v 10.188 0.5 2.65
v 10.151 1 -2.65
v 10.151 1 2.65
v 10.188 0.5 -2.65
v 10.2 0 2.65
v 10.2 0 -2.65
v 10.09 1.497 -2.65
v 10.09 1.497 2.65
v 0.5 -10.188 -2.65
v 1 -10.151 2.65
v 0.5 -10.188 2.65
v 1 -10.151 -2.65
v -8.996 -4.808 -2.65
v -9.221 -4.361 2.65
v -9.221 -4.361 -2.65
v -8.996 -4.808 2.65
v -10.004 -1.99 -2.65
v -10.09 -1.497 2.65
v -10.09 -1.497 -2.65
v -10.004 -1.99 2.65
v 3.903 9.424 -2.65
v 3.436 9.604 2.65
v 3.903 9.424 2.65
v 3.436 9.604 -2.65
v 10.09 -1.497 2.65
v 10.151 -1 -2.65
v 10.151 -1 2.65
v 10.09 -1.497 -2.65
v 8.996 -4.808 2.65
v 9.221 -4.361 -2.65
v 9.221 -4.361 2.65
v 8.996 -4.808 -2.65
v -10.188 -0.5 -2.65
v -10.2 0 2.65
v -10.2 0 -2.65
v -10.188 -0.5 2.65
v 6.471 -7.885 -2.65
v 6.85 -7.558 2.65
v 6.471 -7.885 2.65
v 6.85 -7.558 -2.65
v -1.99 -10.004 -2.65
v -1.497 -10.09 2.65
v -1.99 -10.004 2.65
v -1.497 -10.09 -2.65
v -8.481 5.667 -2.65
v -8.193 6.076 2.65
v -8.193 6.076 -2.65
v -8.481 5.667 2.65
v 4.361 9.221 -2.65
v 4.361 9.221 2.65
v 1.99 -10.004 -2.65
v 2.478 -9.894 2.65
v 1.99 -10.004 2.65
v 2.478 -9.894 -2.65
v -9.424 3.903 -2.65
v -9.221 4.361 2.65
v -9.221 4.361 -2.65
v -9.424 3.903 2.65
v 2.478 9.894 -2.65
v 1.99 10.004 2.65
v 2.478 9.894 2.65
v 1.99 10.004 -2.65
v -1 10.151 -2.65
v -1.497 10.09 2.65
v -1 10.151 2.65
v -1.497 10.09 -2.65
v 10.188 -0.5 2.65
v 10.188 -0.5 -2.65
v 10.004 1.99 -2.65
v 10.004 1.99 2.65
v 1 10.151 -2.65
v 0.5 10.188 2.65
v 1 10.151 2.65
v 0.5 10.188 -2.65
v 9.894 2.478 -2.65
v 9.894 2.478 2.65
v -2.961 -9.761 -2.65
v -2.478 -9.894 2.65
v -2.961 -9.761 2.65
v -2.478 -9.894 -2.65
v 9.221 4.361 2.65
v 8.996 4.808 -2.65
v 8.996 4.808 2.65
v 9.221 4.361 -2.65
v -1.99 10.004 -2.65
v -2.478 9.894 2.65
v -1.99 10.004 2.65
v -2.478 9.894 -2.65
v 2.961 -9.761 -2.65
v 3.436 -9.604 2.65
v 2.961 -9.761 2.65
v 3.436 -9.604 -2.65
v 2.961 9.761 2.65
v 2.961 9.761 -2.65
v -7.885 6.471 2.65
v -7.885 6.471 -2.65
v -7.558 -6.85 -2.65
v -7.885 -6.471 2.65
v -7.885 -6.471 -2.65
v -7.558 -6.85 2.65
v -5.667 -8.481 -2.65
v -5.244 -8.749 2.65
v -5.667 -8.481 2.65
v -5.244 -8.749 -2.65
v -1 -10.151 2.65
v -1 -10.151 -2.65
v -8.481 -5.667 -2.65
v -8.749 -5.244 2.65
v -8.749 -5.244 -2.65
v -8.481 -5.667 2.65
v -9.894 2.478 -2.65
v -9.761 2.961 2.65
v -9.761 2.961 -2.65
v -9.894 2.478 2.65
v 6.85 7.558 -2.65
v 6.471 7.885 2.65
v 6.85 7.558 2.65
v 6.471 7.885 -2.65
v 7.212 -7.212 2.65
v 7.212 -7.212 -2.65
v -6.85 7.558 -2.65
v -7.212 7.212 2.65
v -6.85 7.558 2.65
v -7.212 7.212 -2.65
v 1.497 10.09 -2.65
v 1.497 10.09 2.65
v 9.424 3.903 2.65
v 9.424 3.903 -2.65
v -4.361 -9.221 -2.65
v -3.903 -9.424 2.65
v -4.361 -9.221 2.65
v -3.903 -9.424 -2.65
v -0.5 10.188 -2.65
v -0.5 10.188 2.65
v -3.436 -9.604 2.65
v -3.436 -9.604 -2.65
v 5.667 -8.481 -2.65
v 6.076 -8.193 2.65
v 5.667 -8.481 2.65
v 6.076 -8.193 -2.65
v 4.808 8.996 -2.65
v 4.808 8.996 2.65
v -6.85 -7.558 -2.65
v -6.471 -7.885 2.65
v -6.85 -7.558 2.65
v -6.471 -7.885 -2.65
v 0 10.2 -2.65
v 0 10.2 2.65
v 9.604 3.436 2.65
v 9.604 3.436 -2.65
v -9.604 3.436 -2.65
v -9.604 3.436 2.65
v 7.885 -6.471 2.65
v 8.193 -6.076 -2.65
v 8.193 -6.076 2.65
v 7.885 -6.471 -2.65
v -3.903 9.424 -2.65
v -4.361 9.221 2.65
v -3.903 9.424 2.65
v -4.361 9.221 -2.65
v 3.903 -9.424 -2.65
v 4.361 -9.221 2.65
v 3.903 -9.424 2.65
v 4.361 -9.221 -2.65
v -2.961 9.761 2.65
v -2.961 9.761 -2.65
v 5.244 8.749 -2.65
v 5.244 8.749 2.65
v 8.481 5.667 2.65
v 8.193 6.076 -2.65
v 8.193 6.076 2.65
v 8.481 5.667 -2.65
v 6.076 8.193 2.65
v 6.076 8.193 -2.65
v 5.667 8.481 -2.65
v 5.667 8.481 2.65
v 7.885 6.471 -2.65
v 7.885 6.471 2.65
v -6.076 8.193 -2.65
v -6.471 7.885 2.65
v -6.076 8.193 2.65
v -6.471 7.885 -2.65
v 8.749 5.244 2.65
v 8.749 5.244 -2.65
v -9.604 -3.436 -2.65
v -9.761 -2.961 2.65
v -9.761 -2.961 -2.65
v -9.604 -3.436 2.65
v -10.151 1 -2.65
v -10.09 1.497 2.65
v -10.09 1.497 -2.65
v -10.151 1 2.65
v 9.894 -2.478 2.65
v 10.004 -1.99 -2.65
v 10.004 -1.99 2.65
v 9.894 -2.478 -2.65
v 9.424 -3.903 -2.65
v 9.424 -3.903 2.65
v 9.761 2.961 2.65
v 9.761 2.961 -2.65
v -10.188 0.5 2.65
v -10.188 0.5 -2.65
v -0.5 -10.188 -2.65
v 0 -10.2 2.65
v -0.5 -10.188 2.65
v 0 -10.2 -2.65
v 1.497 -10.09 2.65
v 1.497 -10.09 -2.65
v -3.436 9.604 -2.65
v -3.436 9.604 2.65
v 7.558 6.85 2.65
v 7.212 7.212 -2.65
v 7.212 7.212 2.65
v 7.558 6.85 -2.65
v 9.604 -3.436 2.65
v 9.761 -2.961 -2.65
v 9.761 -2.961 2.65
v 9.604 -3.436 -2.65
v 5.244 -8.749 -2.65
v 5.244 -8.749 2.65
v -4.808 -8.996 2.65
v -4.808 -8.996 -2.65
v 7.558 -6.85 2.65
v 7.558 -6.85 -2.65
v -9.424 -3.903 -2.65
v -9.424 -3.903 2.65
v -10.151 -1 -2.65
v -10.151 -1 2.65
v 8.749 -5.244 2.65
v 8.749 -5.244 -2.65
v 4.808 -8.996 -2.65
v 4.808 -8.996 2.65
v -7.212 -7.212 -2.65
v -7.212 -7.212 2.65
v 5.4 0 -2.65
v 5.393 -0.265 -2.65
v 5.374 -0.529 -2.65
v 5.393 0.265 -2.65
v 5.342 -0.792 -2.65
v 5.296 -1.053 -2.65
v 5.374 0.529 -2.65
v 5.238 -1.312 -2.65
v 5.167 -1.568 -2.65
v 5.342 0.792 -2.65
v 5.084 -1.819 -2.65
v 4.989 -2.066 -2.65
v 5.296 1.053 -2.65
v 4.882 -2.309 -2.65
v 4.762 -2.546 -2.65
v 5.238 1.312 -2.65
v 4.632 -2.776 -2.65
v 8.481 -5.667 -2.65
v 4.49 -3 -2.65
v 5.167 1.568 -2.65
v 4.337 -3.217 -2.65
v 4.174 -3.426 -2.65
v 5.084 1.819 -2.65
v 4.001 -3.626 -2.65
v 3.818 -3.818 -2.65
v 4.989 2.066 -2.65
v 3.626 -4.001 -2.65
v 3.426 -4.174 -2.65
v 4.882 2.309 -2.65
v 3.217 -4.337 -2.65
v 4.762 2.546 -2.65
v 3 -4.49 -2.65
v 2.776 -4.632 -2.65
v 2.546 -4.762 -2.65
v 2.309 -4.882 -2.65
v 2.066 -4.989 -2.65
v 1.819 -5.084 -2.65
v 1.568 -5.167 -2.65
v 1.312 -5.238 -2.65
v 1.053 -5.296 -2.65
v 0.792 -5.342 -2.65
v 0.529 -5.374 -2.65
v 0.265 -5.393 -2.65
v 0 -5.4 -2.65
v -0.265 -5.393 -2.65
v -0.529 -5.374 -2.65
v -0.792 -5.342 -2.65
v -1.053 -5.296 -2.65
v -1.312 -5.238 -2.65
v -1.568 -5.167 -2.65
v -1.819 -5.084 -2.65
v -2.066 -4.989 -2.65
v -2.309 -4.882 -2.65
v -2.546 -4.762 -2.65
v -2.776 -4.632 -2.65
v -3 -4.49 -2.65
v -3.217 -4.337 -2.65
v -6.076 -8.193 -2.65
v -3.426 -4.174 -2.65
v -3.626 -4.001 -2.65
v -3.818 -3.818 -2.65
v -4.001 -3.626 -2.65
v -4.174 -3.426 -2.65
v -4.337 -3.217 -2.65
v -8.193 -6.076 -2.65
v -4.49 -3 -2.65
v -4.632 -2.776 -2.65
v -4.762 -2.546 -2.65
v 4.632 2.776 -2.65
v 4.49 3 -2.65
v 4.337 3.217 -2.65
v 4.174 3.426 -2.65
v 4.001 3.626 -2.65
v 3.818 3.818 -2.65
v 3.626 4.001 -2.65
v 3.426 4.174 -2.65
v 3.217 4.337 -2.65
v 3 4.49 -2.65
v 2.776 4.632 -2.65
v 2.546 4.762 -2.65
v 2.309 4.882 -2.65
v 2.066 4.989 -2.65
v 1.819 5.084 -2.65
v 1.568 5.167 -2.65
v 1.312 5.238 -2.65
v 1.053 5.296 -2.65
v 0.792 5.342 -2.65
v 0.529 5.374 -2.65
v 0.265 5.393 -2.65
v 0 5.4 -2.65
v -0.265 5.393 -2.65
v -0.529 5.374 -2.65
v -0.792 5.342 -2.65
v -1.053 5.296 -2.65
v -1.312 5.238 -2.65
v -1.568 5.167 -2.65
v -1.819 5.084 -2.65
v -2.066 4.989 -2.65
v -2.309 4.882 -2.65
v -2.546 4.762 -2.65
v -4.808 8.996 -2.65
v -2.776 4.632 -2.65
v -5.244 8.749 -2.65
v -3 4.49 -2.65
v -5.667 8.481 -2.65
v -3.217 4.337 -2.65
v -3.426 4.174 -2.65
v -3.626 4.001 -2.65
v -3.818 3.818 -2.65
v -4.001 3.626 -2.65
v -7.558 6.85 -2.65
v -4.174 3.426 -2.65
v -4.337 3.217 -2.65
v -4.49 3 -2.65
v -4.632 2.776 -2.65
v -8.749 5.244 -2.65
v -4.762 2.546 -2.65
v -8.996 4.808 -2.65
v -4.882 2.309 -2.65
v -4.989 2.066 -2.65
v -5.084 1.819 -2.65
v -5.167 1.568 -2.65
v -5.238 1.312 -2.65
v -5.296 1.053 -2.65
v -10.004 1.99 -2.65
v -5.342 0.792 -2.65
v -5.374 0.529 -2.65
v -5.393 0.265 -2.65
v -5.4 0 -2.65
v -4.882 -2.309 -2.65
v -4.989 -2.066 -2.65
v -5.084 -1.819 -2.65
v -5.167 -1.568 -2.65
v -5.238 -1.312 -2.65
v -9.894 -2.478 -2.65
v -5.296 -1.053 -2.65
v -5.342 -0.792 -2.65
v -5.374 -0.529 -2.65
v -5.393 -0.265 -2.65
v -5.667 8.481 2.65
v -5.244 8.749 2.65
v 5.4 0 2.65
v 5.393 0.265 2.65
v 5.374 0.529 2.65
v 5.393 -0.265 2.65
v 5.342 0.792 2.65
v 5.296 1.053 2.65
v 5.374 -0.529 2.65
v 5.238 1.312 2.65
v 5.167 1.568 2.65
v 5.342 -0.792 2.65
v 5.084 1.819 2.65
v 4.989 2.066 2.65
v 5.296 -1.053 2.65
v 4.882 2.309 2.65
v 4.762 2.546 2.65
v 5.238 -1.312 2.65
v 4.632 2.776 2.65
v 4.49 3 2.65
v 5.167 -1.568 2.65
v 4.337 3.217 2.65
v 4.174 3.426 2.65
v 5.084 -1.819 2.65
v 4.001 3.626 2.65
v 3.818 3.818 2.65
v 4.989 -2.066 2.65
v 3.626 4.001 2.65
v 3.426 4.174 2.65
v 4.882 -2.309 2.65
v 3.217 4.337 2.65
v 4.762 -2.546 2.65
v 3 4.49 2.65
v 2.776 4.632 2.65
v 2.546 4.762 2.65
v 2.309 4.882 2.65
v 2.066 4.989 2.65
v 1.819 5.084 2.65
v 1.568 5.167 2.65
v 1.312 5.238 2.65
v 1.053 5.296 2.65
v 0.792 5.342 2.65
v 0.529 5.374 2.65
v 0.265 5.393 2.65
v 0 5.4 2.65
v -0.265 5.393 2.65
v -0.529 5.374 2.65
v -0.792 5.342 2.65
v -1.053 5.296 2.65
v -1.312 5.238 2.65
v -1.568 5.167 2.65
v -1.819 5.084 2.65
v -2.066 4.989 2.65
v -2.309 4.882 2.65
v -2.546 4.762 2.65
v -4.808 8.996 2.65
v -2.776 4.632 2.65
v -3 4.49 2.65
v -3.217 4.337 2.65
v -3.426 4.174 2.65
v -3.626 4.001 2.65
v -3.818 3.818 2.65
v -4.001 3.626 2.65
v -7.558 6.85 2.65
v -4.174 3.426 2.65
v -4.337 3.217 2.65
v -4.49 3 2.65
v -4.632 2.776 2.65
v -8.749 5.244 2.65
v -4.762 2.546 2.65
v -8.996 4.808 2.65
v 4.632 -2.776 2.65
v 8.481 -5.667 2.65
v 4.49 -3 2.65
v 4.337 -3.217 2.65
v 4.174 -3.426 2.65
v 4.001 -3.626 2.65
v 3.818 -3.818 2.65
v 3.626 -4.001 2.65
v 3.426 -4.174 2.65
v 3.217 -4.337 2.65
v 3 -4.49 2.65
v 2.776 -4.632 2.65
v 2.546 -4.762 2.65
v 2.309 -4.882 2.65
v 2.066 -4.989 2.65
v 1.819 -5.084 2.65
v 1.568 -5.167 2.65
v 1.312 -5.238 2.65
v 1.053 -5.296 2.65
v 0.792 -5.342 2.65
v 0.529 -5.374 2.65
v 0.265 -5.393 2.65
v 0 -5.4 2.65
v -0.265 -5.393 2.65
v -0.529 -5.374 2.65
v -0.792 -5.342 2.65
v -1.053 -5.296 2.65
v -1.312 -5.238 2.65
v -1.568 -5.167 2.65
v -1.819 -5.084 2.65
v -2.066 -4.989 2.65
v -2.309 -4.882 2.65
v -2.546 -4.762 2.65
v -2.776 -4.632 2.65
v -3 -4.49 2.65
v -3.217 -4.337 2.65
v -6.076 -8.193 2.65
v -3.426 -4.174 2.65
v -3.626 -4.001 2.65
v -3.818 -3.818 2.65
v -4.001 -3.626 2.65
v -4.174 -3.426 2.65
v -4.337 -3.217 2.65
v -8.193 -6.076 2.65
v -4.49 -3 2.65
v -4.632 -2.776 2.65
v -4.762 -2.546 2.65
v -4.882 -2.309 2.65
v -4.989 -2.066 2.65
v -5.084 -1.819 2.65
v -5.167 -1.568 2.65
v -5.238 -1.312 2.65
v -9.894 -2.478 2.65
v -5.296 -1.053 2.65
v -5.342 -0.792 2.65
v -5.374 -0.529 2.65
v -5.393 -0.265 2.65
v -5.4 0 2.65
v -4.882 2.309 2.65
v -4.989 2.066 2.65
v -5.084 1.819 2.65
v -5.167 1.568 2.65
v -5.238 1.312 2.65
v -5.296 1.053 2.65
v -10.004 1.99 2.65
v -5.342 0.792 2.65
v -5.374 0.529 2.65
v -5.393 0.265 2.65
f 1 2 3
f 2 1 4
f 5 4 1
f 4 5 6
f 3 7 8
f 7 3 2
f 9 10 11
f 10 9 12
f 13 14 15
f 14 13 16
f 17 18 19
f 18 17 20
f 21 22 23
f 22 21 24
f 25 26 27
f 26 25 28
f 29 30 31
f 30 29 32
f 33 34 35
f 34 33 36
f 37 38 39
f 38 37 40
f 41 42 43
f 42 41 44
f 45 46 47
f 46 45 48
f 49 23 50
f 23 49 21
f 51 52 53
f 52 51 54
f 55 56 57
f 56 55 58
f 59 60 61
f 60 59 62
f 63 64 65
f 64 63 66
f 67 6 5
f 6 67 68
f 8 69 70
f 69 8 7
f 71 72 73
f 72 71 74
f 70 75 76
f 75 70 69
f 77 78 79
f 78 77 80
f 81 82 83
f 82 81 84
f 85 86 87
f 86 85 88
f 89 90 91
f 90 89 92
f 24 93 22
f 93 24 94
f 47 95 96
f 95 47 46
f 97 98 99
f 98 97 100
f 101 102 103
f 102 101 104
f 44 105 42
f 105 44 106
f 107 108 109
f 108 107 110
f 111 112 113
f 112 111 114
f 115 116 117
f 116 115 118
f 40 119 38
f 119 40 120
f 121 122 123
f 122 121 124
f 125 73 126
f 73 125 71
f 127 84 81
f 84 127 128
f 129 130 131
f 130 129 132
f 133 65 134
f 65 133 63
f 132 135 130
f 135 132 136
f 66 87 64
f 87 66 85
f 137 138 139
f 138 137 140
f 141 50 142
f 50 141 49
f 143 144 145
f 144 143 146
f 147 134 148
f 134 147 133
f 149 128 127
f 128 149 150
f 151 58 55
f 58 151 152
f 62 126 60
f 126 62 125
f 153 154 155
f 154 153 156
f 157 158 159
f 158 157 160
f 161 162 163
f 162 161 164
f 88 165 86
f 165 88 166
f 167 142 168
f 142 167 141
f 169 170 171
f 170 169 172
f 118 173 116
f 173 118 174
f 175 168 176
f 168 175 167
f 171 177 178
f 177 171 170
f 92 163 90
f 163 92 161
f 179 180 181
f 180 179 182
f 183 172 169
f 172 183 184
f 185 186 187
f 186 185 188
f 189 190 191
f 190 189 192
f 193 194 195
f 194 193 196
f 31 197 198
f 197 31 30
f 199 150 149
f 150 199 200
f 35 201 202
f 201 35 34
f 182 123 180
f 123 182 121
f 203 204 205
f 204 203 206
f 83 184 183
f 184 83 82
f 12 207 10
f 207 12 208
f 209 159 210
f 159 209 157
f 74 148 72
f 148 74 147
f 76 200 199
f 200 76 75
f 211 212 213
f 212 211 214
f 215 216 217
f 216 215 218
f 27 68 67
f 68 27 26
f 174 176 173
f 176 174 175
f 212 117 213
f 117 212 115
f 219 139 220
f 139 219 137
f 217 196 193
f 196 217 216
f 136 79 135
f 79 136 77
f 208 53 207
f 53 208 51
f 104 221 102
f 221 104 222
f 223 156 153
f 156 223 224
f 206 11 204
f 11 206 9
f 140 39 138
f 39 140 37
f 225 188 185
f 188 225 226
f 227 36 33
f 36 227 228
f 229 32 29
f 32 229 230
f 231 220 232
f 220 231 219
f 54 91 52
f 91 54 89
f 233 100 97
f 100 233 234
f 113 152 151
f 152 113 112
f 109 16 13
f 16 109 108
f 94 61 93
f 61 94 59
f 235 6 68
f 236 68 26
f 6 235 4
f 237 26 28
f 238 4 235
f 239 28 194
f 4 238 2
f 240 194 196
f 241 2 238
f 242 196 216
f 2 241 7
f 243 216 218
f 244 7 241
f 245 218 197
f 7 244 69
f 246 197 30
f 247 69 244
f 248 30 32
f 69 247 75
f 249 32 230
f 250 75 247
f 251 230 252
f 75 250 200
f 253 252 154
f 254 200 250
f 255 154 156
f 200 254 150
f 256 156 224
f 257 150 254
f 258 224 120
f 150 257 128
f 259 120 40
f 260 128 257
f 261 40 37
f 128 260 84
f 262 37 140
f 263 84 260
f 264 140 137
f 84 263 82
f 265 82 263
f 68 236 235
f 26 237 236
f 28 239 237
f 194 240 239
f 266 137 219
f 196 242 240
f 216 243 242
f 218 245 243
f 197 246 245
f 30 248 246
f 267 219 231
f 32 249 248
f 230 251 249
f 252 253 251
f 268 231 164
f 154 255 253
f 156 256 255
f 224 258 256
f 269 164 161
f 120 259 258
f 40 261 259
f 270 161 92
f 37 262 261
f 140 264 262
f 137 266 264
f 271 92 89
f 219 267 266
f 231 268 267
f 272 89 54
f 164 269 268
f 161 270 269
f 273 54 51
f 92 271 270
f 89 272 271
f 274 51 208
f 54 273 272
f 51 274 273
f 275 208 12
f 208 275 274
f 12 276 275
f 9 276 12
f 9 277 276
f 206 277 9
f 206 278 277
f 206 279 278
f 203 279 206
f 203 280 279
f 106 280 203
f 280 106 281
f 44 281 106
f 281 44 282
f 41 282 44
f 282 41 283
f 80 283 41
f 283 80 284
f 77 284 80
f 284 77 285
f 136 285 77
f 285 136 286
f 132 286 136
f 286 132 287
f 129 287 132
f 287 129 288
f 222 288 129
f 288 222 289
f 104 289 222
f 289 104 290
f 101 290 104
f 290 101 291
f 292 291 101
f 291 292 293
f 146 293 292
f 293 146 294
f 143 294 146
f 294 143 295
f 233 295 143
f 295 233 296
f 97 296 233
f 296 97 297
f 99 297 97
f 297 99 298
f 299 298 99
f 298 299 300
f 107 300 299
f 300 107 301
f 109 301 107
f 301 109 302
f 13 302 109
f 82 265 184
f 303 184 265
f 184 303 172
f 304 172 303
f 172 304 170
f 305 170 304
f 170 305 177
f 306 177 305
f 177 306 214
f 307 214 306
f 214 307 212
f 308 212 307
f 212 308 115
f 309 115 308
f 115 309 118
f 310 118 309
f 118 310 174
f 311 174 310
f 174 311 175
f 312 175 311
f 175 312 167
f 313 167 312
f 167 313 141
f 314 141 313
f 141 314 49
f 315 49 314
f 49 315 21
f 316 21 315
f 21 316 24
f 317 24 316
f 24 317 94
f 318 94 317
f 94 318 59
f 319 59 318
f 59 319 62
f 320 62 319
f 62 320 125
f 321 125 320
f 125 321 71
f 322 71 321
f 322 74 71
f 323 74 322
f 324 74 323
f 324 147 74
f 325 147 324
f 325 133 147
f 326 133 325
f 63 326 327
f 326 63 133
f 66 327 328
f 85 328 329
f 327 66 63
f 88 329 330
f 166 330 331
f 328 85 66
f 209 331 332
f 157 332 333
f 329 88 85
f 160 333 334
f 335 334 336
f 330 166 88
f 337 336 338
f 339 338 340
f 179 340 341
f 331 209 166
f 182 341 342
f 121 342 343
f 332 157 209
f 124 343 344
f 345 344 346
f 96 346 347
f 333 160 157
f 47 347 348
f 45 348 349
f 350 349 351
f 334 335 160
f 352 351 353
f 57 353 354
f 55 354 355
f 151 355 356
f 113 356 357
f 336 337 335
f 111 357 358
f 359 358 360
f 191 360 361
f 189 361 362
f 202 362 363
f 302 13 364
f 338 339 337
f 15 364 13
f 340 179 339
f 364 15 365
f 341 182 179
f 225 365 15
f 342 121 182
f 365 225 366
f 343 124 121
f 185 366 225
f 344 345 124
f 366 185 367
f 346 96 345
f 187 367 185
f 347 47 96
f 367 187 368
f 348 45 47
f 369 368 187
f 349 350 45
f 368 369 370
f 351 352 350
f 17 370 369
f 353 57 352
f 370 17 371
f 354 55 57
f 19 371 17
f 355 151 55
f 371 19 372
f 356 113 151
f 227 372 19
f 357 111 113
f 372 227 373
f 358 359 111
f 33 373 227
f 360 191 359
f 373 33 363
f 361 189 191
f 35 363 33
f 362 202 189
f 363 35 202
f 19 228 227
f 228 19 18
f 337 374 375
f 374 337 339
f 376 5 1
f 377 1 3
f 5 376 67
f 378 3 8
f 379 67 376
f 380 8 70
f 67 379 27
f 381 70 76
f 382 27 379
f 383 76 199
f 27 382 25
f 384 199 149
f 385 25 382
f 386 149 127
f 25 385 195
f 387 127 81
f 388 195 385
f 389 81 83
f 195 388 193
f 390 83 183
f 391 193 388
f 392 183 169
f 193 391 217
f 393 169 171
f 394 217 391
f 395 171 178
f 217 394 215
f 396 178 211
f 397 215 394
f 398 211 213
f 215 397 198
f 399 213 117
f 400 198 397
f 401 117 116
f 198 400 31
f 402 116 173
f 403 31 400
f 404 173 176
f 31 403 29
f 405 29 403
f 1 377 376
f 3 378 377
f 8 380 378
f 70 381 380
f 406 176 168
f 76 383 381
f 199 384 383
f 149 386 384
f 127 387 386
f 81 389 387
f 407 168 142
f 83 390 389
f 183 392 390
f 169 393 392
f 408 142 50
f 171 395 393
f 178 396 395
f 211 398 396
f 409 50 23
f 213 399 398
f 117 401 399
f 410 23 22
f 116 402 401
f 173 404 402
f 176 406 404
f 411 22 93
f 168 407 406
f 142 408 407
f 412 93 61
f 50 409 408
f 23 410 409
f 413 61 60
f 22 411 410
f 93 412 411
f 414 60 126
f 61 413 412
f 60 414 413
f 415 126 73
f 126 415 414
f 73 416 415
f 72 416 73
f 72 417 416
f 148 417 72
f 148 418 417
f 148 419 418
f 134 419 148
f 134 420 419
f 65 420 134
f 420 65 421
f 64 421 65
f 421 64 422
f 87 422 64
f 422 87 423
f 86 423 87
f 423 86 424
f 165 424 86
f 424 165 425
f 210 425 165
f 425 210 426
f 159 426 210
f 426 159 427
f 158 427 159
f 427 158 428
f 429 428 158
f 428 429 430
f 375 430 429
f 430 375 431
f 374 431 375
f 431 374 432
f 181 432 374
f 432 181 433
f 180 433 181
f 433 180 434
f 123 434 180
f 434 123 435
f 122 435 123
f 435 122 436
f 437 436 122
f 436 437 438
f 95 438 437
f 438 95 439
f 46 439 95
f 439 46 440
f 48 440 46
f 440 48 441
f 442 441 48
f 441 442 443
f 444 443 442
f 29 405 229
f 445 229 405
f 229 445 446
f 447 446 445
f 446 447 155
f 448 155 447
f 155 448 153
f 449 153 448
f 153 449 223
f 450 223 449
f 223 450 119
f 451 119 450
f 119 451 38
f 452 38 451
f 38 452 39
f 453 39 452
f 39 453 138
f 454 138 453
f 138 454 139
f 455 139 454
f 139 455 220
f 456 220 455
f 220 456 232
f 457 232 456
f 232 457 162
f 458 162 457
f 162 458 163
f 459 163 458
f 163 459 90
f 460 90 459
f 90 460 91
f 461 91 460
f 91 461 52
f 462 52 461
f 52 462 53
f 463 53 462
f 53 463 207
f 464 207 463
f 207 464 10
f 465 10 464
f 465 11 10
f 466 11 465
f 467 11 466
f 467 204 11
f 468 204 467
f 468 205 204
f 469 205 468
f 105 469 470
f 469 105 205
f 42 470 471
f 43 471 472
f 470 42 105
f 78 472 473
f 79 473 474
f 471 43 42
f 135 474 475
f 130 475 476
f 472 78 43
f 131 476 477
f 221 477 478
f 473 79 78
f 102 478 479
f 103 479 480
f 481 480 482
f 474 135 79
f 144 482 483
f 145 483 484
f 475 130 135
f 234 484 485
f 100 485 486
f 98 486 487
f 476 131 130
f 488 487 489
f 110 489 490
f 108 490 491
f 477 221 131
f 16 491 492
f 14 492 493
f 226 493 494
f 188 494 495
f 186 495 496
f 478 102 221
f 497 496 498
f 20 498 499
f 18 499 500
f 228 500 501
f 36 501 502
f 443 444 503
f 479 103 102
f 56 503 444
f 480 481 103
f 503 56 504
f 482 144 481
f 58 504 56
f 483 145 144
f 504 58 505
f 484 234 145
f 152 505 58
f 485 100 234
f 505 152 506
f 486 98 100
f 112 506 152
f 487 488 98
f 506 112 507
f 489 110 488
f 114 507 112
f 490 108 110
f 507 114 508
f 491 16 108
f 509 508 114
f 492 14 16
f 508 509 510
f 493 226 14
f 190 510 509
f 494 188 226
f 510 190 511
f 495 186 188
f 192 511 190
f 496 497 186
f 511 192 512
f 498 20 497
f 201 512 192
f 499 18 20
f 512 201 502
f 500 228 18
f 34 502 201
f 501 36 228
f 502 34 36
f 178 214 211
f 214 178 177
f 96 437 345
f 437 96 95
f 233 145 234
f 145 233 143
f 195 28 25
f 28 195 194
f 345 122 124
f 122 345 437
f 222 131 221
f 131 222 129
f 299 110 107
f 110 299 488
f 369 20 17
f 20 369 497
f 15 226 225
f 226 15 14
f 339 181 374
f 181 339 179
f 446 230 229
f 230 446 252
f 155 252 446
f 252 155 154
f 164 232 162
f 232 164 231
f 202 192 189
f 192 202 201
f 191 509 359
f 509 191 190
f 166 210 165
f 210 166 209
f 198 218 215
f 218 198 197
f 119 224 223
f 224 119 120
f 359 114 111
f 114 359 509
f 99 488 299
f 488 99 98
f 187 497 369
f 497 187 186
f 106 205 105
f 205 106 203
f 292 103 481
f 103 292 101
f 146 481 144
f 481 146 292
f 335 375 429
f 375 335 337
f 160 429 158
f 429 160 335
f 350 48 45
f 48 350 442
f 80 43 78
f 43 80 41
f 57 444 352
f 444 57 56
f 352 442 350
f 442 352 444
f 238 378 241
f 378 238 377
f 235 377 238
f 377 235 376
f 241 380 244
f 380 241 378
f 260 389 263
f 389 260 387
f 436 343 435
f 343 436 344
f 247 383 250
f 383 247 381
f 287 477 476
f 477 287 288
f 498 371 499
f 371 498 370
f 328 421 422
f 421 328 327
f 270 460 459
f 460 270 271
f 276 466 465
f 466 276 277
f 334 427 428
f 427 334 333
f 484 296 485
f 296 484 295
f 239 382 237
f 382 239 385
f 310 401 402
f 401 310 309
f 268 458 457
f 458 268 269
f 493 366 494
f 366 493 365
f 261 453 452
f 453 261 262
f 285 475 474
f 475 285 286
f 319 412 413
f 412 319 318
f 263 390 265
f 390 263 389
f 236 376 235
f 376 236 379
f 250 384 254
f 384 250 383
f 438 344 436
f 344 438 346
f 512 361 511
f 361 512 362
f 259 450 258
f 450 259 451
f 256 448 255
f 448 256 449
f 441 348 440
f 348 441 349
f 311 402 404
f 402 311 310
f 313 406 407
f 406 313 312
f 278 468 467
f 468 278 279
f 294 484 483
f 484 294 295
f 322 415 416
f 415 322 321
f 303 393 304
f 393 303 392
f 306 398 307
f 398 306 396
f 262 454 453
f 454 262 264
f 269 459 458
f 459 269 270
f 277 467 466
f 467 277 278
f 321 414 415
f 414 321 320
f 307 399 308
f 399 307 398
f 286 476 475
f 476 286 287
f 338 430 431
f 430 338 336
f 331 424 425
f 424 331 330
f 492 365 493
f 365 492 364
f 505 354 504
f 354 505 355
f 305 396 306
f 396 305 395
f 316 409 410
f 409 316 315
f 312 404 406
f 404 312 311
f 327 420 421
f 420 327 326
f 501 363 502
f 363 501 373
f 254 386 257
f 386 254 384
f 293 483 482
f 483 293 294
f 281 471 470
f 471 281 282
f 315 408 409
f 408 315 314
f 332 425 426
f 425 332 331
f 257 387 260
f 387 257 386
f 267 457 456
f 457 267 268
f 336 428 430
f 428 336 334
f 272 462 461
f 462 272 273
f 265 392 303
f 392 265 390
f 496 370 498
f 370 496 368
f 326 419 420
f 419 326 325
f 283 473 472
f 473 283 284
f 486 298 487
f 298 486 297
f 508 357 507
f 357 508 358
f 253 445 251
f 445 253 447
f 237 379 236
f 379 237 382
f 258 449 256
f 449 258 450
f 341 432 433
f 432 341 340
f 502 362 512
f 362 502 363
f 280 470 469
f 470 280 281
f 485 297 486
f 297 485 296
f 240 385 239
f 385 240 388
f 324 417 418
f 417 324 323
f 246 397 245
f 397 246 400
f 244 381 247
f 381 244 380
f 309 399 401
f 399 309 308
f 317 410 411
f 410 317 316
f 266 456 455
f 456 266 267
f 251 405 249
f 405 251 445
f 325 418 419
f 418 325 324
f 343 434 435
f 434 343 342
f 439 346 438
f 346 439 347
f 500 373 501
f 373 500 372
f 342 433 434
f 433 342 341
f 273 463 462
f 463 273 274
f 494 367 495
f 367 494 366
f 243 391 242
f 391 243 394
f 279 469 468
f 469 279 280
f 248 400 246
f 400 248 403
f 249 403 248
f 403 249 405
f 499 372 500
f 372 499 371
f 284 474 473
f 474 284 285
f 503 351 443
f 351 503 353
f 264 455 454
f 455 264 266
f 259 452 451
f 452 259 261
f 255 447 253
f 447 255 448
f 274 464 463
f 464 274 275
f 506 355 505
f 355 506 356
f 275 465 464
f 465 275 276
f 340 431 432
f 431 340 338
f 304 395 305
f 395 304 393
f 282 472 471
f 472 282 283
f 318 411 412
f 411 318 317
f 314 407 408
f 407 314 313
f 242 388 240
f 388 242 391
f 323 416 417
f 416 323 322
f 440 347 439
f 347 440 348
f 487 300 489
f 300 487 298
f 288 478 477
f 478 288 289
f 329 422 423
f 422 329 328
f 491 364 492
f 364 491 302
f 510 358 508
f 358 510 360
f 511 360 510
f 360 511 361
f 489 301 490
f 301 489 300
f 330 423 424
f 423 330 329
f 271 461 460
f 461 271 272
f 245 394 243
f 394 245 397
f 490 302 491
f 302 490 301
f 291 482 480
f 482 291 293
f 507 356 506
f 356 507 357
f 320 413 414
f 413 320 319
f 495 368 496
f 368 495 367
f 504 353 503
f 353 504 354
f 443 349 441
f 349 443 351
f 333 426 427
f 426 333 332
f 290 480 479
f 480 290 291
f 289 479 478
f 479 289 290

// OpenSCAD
// Radial parameters: [20.4, 10.8, 5.3, 1]
// Interpreted as: [outer_diameter, inner_diameter, height, wall_thickness]

outer_diameter = 20.4;
inner_diameter = 10.8;
height         = 5.3;
wall_thickness = 1;

$fn = 128;

outer_r = outer_diameter/2;
inner_r = inner_diameter/2;

// Ensure a single connected solid: a ring (annulus) with the specified radii and height.
difference() {
    cylinder(h=height, r=outer_r, center=true);
    cylinder(h=height + 2*0.02, r=inner_r, center=true); // slight overshoot to avoid coplanar artifacts
}
